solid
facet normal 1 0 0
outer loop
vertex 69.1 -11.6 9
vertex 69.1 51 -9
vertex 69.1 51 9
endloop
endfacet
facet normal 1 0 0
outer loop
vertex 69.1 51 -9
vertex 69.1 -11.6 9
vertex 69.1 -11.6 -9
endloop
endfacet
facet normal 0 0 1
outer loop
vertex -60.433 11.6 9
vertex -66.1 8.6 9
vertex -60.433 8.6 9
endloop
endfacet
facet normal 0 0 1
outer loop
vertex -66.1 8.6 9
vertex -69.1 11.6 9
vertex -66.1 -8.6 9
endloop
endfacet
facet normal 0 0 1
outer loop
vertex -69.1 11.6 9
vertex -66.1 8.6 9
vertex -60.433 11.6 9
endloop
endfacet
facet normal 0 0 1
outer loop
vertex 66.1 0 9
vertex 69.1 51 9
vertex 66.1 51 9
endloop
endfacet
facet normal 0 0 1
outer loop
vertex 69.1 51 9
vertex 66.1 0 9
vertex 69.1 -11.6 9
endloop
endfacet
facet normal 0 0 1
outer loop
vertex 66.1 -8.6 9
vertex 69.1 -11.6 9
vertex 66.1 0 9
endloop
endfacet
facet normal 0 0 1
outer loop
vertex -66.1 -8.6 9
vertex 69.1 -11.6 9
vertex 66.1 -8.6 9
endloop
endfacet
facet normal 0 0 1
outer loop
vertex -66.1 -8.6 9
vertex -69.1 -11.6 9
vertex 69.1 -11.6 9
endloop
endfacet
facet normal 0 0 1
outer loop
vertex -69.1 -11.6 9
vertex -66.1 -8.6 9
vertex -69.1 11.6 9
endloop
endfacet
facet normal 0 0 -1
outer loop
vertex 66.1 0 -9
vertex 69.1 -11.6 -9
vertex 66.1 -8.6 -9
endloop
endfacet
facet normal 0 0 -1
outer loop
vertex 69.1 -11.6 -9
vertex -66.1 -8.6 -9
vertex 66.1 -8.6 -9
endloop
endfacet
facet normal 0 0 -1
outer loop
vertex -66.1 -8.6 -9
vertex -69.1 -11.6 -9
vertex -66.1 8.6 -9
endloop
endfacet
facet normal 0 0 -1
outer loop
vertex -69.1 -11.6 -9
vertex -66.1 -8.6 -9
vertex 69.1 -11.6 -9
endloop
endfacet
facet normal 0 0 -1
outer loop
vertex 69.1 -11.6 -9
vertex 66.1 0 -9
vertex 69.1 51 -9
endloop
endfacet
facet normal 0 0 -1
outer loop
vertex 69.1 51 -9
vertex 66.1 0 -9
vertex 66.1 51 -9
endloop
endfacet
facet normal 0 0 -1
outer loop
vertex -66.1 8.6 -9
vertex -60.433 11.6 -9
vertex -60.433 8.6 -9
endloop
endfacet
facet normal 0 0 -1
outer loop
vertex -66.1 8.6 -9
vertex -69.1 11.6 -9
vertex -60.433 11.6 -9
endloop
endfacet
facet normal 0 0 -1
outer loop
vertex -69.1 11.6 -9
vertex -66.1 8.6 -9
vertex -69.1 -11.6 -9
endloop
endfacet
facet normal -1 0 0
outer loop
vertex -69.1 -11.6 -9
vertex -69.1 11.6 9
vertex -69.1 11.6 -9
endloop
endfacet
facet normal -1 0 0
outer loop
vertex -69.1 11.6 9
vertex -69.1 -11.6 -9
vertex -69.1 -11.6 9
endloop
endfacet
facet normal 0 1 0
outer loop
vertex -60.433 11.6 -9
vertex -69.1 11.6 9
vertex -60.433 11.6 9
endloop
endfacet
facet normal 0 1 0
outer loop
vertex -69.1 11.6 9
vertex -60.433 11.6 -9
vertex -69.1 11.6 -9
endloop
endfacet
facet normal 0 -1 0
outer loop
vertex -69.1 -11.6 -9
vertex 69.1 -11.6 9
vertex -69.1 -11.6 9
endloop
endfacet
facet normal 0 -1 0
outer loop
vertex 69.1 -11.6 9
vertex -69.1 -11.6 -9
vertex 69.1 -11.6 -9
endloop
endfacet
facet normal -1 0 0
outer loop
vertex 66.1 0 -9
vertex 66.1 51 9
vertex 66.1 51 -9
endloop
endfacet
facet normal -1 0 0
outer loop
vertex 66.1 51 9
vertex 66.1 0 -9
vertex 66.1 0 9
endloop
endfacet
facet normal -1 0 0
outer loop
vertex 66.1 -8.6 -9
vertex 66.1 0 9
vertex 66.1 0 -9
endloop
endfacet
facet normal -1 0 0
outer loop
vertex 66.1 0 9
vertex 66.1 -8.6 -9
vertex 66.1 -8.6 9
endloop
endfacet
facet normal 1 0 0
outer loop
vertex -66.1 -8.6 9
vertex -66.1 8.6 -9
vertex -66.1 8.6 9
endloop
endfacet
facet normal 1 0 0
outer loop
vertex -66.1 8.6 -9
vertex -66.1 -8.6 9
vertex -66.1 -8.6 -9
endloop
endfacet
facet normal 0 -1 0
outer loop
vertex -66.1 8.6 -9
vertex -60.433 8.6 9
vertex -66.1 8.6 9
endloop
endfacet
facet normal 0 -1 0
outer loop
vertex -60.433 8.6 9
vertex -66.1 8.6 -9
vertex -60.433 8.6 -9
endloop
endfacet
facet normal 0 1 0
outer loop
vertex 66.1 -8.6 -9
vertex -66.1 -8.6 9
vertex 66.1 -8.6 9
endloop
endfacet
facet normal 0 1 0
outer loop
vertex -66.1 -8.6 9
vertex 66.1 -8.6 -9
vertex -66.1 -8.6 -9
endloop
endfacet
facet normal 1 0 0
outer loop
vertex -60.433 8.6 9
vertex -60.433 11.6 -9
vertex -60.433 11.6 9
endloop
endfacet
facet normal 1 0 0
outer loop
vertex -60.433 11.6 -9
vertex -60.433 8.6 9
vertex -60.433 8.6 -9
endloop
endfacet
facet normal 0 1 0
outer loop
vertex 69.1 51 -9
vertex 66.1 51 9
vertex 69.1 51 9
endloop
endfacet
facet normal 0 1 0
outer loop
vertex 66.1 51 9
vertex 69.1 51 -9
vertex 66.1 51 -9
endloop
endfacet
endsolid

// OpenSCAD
length = 132;
height = 17;
thickness =3;
wide = 18;

difference() {
  cube([length+thickness*2+0.2, height+thickness*2+0.2, wide], center=true);
  
  cube([length+0.2, height+0.2, wide*thickness*2], center=true);
  translate([height/6, thickness*2, 0])
  cube([length+0.2-height/3, height, wide*thickness*2], center=true);
}

translate([(length+thickness+0.2)/2, (3*height)/2, 0])
cube([thickness, 3*height, wide], center=true);
